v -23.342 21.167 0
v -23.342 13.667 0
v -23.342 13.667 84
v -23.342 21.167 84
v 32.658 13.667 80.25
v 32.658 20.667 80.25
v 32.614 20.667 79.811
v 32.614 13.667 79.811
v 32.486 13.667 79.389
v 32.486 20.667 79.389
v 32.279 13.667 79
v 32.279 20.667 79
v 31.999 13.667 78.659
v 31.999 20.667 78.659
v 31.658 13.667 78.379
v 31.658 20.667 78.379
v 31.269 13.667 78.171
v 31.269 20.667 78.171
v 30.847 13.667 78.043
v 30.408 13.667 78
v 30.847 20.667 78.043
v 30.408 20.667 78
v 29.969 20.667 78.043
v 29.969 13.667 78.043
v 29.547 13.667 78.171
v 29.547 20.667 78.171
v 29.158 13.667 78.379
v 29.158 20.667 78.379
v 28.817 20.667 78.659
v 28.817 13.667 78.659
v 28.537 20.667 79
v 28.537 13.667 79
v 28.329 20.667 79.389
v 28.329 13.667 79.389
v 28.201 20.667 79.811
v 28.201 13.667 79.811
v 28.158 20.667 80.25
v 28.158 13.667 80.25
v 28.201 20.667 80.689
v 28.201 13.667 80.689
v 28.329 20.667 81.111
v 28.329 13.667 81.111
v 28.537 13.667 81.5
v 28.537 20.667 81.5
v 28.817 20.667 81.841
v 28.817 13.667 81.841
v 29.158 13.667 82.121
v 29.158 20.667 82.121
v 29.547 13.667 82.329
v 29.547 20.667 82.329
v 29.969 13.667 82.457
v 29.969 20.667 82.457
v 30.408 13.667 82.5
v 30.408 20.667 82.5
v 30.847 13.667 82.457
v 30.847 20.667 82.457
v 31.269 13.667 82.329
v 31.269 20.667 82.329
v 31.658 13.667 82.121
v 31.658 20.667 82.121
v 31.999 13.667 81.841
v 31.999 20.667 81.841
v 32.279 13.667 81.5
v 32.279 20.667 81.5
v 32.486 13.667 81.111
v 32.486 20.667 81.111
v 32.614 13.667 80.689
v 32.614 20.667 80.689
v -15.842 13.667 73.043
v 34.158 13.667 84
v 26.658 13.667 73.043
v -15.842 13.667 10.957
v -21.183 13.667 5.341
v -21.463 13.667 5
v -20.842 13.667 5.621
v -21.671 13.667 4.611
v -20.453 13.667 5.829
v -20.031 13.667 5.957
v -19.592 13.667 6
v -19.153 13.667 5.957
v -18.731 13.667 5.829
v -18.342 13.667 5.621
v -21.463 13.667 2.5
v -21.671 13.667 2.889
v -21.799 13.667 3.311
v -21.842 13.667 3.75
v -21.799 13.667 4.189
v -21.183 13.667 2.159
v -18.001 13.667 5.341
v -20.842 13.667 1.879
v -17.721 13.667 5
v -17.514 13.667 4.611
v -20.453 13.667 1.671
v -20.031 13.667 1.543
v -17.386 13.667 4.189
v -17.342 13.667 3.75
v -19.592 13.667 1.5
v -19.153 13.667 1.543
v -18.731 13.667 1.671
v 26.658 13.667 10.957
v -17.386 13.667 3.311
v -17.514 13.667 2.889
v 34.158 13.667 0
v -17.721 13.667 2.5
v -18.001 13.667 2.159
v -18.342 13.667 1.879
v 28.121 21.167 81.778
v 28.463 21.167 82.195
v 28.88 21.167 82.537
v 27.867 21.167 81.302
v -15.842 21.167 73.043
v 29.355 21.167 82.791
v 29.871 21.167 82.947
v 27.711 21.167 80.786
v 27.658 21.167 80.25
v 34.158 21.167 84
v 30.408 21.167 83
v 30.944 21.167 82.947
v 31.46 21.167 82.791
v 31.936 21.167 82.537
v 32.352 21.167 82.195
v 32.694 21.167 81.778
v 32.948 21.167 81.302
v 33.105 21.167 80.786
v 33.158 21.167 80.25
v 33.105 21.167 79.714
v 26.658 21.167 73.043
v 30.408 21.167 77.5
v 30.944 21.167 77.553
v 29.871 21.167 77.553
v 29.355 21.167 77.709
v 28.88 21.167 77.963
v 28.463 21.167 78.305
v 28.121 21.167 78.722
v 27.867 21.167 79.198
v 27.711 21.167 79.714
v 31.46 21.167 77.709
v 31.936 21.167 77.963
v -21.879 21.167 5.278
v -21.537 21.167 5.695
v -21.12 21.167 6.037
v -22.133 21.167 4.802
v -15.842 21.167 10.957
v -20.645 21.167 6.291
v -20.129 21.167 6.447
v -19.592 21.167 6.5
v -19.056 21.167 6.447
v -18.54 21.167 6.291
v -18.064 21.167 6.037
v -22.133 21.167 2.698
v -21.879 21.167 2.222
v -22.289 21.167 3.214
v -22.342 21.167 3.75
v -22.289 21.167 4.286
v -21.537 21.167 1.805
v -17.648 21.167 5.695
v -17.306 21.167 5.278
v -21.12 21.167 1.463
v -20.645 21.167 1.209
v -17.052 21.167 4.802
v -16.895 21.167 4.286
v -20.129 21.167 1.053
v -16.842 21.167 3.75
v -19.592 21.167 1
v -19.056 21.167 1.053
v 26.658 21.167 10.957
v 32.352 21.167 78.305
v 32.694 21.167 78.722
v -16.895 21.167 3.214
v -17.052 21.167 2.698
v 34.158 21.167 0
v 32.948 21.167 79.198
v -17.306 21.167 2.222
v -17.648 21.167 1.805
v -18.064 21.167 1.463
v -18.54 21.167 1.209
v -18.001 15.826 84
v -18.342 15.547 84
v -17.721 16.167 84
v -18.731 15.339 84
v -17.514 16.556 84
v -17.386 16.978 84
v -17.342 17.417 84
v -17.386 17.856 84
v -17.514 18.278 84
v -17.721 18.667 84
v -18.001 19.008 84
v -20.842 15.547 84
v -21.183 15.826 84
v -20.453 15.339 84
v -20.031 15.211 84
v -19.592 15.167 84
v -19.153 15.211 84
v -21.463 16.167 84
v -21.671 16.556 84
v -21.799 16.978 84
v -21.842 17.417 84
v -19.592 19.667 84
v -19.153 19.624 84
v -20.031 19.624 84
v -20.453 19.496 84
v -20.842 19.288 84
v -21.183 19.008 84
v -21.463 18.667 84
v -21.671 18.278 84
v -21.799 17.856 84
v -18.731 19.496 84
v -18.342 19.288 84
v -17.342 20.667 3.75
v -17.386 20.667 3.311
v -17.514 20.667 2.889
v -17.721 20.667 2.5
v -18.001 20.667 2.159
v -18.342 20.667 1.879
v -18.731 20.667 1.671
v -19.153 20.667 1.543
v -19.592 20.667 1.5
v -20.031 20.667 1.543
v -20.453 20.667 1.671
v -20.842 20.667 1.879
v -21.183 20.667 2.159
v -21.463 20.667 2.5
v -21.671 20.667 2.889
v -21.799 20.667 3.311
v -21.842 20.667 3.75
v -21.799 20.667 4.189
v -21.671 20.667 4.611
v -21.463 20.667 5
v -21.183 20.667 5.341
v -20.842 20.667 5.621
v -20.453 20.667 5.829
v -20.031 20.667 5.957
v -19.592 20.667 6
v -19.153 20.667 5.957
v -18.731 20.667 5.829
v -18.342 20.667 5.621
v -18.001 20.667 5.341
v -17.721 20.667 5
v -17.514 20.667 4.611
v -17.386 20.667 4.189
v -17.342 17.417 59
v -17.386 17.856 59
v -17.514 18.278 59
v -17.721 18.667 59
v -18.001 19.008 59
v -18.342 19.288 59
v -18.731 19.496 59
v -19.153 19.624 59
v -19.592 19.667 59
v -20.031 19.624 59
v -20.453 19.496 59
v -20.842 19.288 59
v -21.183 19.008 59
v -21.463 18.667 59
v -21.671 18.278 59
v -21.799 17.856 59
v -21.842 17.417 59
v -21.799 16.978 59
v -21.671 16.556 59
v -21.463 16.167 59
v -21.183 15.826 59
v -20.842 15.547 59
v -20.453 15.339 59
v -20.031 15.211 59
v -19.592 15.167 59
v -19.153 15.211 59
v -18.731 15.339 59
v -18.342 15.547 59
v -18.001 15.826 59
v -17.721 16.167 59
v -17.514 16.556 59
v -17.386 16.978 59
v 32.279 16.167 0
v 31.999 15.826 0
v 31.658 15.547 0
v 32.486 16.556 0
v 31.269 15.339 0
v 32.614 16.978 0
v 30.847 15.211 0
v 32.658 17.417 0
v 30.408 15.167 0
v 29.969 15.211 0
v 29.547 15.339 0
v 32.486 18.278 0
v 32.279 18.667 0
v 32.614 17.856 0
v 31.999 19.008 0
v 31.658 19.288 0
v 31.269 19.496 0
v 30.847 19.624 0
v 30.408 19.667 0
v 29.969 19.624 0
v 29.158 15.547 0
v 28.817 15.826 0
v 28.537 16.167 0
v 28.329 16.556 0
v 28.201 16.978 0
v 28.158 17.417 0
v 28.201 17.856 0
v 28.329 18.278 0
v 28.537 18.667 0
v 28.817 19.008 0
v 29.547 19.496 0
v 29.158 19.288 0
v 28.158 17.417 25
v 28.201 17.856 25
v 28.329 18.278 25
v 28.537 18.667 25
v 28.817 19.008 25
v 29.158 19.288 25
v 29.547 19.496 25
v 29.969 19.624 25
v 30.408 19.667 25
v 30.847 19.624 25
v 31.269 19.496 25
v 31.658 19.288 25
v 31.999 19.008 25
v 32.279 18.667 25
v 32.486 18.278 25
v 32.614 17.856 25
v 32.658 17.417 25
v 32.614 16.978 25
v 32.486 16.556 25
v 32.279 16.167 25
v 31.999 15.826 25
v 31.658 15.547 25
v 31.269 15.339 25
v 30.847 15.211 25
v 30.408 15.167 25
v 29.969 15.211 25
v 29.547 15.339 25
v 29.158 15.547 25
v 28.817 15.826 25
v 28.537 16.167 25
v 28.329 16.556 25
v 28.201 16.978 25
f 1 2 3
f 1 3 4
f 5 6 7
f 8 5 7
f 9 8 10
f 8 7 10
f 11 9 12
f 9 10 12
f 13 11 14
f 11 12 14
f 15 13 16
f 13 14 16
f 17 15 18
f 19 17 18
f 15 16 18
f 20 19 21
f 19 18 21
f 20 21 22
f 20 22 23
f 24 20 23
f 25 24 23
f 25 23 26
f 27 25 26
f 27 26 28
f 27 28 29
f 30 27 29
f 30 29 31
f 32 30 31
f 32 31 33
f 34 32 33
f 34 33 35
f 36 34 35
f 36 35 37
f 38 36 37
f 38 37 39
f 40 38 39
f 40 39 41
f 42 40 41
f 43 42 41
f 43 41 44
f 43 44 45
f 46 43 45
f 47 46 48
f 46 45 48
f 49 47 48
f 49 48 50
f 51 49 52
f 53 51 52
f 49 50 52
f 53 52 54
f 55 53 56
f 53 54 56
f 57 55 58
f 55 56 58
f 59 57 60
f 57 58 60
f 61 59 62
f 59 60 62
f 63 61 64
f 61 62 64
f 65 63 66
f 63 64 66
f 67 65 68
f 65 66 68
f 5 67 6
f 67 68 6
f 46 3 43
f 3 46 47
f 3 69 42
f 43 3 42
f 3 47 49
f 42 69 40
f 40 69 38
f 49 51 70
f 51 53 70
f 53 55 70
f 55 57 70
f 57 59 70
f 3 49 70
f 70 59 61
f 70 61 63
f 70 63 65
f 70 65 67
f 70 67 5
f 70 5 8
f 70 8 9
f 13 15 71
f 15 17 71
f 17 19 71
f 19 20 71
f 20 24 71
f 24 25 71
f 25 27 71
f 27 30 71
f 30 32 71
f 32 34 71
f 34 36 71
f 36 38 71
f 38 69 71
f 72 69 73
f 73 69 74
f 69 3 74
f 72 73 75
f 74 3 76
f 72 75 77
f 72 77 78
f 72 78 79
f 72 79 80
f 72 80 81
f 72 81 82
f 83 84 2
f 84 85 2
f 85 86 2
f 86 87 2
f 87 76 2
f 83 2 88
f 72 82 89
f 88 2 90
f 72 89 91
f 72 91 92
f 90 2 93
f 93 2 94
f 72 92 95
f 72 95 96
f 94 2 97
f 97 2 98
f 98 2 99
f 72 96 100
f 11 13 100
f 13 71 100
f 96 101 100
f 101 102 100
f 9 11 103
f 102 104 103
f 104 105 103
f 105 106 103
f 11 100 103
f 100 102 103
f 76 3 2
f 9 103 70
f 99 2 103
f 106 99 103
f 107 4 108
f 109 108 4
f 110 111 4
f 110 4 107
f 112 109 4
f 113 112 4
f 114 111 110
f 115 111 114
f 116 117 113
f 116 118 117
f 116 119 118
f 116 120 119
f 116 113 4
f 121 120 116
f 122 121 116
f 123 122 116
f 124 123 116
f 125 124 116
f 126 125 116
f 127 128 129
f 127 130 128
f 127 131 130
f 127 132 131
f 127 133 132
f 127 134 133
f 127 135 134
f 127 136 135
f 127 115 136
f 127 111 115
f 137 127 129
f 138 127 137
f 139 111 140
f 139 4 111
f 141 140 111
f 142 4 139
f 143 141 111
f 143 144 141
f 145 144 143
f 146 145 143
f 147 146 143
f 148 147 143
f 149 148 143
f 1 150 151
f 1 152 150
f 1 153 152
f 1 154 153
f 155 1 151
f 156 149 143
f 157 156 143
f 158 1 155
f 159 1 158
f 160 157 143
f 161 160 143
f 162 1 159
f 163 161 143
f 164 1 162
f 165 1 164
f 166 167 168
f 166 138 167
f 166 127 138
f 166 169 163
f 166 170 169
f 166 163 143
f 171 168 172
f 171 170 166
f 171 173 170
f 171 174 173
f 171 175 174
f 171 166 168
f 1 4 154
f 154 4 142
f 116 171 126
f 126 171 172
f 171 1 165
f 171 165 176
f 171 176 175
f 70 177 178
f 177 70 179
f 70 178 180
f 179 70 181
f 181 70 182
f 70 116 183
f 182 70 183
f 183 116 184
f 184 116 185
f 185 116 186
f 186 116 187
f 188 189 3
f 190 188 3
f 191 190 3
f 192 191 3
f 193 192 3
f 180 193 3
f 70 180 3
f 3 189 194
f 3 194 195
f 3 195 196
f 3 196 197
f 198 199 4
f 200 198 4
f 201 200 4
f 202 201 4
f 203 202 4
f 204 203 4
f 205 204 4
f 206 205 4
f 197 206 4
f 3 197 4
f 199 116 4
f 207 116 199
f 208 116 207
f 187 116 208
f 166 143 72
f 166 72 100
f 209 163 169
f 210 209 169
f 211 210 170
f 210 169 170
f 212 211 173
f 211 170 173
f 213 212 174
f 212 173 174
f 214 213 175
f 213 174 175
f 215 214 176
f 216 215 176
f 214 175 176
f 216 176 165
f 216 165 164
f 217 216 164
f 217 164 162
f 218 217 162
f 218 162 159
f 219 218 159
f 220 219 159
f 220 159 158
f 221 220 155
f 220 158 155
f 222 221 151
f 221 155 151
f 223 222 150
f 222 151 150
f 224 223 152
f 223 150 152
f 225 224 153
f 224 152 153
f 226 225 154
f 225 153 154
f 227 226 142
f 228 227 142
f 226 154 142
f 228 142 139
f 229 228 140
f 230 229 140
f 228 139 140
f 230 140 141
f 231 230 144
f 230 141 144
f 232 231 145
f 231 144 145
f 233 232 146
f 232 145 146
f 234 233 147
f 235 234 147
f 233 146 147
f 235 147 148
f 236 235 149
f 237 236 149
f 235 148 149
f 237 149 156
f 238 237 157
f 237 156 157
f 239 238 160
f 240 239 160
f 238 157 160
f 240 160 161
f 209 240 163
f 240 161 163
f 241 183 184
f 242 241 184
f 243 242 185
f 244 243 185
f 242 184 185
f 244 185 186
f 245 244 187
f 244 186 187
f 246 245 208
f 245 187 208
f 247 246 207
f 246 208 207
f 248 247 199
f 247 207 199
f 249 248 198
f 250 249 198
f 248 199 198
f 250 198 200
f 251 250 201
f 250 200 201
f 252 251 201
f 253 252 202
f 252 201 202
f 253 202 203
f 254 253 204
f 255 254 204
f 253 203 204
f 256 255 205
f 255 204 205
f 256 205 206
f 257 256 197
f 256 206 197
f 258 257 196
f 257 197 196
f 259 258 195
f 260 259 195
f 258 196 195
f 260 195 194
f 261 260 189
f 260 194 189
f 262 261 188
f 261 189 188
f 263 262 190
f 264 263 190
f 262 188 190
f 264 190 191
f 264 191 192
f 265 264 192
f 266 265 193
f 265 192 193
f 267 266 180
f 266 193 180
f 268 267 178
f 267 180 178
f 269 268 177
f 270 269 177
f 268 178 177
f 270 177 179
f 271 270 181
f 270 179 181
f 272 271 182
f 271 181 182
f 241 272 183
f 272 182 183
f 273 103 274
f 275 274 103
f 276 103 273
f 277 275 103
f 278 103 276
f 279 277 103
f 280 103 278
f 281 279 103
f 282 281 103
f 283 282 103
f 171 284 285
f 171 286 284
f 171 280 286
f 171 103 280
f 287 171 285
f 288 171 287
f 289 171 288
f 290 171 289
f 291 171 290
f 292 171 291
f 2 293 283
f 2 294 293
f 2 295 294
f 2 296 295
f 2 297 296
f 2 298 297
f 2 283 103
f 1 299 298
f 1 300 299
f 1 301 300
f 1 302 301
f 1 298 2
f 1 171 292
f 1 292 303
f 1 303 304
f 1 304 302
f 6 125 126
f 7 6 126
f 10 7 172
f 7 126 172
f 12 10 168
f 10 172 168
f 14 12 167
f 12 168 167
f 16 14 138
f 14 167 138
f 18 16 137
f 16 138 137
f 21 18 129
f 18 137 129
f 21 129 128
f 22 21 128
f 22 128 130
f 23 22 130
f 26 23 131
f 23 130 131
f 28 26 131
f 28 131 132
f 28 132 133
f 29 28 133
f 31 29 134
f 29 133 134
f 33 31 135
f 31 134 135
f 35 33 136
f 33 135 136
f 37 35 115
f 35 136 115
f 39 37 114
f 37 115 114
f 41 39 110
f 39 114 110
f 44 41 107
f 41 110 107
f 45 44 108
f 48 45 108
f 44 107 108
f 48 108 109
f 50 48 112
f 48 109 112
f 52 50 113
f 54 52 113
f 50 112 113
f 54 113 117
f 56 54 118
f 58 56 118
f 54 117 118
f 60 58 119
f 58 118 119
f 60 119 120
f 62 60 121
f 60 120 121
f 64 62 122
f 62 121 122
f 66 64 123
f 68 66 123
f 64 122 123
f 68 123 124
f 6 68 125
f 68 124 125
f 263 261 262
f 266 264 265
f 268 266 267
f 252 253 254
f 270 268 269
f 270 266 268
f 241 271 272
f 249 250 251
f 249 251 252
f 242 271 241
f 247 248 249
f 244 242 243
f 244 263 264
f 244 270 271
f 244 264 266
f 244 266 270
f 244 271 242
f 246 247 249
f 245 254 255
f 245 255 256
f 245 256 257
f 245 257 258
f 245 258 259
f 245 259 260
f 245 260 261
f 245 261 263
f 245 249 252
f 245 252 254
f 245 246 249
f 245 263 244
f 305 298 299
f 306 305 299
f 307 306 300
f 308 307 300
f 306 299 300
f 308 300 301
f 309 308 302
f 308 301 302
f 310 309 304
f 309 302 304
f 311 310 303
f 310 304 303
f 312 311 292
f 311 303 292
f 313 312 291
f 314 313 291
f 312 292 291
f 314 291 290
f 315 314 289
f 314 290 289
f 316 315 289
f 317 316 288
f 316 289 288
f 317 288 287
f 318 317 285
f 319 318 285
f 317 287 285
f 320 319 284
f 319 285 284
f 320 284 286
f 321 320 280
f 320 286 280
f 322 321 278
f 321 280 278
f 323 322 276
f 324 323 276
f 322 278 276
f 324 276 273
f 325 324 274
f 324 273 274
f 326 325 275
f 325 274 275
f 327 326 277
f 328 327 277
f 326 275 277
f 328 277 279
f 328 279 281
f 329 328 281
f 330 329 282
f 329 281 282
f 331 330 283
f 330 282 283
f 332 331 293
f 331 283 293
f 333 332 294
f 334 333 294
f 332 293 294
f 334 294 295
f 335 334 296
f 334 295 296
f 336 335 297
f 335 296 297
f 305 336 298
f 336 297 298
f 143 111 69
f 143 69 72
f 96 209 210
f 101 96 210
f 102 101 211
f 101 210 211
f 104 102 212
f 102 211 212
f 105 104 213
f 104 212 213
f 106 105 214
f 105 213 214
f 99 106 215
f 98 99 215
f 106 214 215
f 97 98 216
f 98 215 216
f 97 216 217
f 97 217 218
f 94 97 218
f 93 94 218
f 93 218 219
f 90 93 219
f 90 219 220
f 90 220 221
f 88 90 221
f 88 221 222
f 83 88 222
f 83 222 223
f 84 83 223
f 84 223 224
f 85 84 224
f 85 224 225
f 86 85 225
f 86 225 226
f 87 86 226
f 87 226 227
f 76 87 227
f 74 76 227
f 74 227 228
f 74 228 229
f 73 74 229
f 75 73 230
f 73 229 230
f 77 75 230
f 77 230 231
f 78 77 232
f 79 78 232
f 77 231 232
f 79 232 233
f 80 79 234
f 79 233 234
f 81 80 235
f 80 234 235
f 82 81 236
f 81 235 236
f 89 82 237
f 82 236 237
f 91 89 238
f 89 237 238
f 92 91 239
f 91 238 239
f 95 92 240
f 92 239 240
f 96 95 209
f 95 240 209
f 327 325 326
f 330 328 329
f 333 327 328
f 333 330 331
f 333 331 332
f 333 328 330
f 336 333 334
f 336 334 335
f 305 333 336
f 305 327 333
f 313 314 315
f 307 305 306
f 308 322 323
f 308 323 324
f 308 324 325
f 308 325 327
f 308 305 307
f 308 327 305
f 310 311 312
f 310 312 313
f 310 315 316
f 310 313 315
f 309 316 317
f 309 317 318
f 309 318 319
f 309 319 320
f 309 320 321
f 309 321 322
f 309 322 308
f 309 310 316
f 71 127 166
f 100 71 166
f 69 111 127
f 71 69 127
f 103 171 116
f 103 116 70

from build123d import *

# Parameters (mm, degrees)
BOSS_EXTRU_1_DEPTH      = 84
ESQUISSE3_R             = 2.25
ENL_V_MAT_EXTRU_1_DEPTH = 25
ENL_V_MAT_EXTRU_2_REACH = 9.5
ESQUISSE4_R             = 2.25
ESQUISSE4_W             = 42.5
ESQUISSE4_H             = 62.086956522
ESQUISSE5_R             = 2.25
ENL_V_MAT_EXTRU_3_DEPTH = 25
CHANFREIN1_SIZE         = 0.5


with BuildPart() as part:
    # Esquisse1 → Boss.-Extru.1 (new body)
    with BuildSketch(Plane.XY):
        Polygon((-15.842295968, 13.667406166), (-23.342295968, 13.667406166), (-23.342295968, 21.167406166), (34.157704032, 21.167406166), (34.157704032, 13.667406166), (26.657704032, 13.667406166), align=None)
    extrude(amount=BOSS_EXTRU_1_DEPTH)

    # Esquisse3 → Enlèv. mat.-Extru.1 (cut)
    with BuildSketch(Plane.XY.offset(84)):
        with Locations((-19.592295968, 17.417406166)):
            Circle(ESQUISSE3_R)
    extrude(amount=-ENL_V_MAT_EXTRU_1_DEPTH, mode=Mode.SUBTRACT)

    # Esquisse4 → Enlèv. mat.-Extru.2 (cut, up to next)
    with BuildSketch(Plane(origin=(0, 21.167406166, 0), x_dir=(1, 0, 0), z_dir=(0, 1, 0)), mode=Mode.PRIVATE) as enl_v_mat_extru_2_sk1:
        with Locations((30.407704032, -80.25)):
            Circle(ESQUISSE4_R)
    enl_v_mat_extru_2_tool1 = extrude(enl_v_mat_extru_2_sk1.sketch, amount=-ENL_V_MAT_EXTRU_2_REACH, mode=Mode.PRIVATE) & part.part
    add(enl_v_mat_extru_2_tool1.solids().sort_by_distance((30.407704, 21.167406, 80.25))[0], mode=Mode.SUBTRACT)
    # Esquisse4 → Enlèv. mat.-Extru.2 (cut, up to next)
    with BuildSketch(Plane(origin=(0, 21.167406166, 0), x_dir=(1, 0, 0), z_dir=(0, 1, 0)), mode=Mode.PRIVATE) as enl_v_mat_extru_2_sk2:
        with Locations((-19.592295968, -3.75)):
            Circle(ESQUISSE4_R)
    enl_v_mat_extru_2_tool2 = extrude(enl_v_mat_extru_2_sk2.sketch, amount=-ENL_V_MAT_EXTRU_2_REACH, mode=Mode.PRIVATE) & part.part
    add(enl_v_mat_extru_2_tool2.solids().sort_by_distance((-19.592296, 21.167406, 3.75))[0], mode=Mode.SUBTRACT)
    # Esquisse4 → Enlèv. mat.-Extru.2 (cut, up to next)
    with BuildSketch(Plane(origin=(0, 21.167406166, 0), x_dir=(1, 0, 0), z_dir=(0, 1, 0)), mode=Mode.PRIVATE) as enl_v_mat_extru_2_sk3:
        with Locations((5.407704032, -42)):
            Rectangle(ESQUISSE4_W, ESQUISSE4_H)
    enl_v_mat_extru_2_tool3 = extrude(enl_v_mat_extru_2_sk3.sketch, amount=-ENL_V_MAT_EXTRU_2_REACH, mode=Mode.PRIVATE) & part.part
    add(enl_v_mat_extru_2_tool3.solids().sort_by_distance((5.407704, 21.167406, 42))[0], mode=Mode.SUBTRACT)

    # Esquisse5 → Enlèv. mat.-Extru.3 (cut)
    with BuildSketch(Plane(origin=(0, 0, 0), x_dir=(-1, 0, 0), z_dir=(0, 0, -1))):
        with Locations((-30.407704032, 17.417406166)):
            Circle(ESQUISSE5_R)
    extrude(amount=-ENL_V_MAT_EXTRU_3_DEPTH, mode=Mode.SUBTRACT)

    # Chanfrein1
    chanfrein1_edges = [part.edges().sort_by_distance(p)[0] for p in [
        (28.157704032, 21.167406166, 80.25),
        (-21.842295968, 21.167406166, 3.75),
    ]]
    chamfer(chanfrein1_edges, length=CHANFREIN1_SIZE)


solid = part.part
